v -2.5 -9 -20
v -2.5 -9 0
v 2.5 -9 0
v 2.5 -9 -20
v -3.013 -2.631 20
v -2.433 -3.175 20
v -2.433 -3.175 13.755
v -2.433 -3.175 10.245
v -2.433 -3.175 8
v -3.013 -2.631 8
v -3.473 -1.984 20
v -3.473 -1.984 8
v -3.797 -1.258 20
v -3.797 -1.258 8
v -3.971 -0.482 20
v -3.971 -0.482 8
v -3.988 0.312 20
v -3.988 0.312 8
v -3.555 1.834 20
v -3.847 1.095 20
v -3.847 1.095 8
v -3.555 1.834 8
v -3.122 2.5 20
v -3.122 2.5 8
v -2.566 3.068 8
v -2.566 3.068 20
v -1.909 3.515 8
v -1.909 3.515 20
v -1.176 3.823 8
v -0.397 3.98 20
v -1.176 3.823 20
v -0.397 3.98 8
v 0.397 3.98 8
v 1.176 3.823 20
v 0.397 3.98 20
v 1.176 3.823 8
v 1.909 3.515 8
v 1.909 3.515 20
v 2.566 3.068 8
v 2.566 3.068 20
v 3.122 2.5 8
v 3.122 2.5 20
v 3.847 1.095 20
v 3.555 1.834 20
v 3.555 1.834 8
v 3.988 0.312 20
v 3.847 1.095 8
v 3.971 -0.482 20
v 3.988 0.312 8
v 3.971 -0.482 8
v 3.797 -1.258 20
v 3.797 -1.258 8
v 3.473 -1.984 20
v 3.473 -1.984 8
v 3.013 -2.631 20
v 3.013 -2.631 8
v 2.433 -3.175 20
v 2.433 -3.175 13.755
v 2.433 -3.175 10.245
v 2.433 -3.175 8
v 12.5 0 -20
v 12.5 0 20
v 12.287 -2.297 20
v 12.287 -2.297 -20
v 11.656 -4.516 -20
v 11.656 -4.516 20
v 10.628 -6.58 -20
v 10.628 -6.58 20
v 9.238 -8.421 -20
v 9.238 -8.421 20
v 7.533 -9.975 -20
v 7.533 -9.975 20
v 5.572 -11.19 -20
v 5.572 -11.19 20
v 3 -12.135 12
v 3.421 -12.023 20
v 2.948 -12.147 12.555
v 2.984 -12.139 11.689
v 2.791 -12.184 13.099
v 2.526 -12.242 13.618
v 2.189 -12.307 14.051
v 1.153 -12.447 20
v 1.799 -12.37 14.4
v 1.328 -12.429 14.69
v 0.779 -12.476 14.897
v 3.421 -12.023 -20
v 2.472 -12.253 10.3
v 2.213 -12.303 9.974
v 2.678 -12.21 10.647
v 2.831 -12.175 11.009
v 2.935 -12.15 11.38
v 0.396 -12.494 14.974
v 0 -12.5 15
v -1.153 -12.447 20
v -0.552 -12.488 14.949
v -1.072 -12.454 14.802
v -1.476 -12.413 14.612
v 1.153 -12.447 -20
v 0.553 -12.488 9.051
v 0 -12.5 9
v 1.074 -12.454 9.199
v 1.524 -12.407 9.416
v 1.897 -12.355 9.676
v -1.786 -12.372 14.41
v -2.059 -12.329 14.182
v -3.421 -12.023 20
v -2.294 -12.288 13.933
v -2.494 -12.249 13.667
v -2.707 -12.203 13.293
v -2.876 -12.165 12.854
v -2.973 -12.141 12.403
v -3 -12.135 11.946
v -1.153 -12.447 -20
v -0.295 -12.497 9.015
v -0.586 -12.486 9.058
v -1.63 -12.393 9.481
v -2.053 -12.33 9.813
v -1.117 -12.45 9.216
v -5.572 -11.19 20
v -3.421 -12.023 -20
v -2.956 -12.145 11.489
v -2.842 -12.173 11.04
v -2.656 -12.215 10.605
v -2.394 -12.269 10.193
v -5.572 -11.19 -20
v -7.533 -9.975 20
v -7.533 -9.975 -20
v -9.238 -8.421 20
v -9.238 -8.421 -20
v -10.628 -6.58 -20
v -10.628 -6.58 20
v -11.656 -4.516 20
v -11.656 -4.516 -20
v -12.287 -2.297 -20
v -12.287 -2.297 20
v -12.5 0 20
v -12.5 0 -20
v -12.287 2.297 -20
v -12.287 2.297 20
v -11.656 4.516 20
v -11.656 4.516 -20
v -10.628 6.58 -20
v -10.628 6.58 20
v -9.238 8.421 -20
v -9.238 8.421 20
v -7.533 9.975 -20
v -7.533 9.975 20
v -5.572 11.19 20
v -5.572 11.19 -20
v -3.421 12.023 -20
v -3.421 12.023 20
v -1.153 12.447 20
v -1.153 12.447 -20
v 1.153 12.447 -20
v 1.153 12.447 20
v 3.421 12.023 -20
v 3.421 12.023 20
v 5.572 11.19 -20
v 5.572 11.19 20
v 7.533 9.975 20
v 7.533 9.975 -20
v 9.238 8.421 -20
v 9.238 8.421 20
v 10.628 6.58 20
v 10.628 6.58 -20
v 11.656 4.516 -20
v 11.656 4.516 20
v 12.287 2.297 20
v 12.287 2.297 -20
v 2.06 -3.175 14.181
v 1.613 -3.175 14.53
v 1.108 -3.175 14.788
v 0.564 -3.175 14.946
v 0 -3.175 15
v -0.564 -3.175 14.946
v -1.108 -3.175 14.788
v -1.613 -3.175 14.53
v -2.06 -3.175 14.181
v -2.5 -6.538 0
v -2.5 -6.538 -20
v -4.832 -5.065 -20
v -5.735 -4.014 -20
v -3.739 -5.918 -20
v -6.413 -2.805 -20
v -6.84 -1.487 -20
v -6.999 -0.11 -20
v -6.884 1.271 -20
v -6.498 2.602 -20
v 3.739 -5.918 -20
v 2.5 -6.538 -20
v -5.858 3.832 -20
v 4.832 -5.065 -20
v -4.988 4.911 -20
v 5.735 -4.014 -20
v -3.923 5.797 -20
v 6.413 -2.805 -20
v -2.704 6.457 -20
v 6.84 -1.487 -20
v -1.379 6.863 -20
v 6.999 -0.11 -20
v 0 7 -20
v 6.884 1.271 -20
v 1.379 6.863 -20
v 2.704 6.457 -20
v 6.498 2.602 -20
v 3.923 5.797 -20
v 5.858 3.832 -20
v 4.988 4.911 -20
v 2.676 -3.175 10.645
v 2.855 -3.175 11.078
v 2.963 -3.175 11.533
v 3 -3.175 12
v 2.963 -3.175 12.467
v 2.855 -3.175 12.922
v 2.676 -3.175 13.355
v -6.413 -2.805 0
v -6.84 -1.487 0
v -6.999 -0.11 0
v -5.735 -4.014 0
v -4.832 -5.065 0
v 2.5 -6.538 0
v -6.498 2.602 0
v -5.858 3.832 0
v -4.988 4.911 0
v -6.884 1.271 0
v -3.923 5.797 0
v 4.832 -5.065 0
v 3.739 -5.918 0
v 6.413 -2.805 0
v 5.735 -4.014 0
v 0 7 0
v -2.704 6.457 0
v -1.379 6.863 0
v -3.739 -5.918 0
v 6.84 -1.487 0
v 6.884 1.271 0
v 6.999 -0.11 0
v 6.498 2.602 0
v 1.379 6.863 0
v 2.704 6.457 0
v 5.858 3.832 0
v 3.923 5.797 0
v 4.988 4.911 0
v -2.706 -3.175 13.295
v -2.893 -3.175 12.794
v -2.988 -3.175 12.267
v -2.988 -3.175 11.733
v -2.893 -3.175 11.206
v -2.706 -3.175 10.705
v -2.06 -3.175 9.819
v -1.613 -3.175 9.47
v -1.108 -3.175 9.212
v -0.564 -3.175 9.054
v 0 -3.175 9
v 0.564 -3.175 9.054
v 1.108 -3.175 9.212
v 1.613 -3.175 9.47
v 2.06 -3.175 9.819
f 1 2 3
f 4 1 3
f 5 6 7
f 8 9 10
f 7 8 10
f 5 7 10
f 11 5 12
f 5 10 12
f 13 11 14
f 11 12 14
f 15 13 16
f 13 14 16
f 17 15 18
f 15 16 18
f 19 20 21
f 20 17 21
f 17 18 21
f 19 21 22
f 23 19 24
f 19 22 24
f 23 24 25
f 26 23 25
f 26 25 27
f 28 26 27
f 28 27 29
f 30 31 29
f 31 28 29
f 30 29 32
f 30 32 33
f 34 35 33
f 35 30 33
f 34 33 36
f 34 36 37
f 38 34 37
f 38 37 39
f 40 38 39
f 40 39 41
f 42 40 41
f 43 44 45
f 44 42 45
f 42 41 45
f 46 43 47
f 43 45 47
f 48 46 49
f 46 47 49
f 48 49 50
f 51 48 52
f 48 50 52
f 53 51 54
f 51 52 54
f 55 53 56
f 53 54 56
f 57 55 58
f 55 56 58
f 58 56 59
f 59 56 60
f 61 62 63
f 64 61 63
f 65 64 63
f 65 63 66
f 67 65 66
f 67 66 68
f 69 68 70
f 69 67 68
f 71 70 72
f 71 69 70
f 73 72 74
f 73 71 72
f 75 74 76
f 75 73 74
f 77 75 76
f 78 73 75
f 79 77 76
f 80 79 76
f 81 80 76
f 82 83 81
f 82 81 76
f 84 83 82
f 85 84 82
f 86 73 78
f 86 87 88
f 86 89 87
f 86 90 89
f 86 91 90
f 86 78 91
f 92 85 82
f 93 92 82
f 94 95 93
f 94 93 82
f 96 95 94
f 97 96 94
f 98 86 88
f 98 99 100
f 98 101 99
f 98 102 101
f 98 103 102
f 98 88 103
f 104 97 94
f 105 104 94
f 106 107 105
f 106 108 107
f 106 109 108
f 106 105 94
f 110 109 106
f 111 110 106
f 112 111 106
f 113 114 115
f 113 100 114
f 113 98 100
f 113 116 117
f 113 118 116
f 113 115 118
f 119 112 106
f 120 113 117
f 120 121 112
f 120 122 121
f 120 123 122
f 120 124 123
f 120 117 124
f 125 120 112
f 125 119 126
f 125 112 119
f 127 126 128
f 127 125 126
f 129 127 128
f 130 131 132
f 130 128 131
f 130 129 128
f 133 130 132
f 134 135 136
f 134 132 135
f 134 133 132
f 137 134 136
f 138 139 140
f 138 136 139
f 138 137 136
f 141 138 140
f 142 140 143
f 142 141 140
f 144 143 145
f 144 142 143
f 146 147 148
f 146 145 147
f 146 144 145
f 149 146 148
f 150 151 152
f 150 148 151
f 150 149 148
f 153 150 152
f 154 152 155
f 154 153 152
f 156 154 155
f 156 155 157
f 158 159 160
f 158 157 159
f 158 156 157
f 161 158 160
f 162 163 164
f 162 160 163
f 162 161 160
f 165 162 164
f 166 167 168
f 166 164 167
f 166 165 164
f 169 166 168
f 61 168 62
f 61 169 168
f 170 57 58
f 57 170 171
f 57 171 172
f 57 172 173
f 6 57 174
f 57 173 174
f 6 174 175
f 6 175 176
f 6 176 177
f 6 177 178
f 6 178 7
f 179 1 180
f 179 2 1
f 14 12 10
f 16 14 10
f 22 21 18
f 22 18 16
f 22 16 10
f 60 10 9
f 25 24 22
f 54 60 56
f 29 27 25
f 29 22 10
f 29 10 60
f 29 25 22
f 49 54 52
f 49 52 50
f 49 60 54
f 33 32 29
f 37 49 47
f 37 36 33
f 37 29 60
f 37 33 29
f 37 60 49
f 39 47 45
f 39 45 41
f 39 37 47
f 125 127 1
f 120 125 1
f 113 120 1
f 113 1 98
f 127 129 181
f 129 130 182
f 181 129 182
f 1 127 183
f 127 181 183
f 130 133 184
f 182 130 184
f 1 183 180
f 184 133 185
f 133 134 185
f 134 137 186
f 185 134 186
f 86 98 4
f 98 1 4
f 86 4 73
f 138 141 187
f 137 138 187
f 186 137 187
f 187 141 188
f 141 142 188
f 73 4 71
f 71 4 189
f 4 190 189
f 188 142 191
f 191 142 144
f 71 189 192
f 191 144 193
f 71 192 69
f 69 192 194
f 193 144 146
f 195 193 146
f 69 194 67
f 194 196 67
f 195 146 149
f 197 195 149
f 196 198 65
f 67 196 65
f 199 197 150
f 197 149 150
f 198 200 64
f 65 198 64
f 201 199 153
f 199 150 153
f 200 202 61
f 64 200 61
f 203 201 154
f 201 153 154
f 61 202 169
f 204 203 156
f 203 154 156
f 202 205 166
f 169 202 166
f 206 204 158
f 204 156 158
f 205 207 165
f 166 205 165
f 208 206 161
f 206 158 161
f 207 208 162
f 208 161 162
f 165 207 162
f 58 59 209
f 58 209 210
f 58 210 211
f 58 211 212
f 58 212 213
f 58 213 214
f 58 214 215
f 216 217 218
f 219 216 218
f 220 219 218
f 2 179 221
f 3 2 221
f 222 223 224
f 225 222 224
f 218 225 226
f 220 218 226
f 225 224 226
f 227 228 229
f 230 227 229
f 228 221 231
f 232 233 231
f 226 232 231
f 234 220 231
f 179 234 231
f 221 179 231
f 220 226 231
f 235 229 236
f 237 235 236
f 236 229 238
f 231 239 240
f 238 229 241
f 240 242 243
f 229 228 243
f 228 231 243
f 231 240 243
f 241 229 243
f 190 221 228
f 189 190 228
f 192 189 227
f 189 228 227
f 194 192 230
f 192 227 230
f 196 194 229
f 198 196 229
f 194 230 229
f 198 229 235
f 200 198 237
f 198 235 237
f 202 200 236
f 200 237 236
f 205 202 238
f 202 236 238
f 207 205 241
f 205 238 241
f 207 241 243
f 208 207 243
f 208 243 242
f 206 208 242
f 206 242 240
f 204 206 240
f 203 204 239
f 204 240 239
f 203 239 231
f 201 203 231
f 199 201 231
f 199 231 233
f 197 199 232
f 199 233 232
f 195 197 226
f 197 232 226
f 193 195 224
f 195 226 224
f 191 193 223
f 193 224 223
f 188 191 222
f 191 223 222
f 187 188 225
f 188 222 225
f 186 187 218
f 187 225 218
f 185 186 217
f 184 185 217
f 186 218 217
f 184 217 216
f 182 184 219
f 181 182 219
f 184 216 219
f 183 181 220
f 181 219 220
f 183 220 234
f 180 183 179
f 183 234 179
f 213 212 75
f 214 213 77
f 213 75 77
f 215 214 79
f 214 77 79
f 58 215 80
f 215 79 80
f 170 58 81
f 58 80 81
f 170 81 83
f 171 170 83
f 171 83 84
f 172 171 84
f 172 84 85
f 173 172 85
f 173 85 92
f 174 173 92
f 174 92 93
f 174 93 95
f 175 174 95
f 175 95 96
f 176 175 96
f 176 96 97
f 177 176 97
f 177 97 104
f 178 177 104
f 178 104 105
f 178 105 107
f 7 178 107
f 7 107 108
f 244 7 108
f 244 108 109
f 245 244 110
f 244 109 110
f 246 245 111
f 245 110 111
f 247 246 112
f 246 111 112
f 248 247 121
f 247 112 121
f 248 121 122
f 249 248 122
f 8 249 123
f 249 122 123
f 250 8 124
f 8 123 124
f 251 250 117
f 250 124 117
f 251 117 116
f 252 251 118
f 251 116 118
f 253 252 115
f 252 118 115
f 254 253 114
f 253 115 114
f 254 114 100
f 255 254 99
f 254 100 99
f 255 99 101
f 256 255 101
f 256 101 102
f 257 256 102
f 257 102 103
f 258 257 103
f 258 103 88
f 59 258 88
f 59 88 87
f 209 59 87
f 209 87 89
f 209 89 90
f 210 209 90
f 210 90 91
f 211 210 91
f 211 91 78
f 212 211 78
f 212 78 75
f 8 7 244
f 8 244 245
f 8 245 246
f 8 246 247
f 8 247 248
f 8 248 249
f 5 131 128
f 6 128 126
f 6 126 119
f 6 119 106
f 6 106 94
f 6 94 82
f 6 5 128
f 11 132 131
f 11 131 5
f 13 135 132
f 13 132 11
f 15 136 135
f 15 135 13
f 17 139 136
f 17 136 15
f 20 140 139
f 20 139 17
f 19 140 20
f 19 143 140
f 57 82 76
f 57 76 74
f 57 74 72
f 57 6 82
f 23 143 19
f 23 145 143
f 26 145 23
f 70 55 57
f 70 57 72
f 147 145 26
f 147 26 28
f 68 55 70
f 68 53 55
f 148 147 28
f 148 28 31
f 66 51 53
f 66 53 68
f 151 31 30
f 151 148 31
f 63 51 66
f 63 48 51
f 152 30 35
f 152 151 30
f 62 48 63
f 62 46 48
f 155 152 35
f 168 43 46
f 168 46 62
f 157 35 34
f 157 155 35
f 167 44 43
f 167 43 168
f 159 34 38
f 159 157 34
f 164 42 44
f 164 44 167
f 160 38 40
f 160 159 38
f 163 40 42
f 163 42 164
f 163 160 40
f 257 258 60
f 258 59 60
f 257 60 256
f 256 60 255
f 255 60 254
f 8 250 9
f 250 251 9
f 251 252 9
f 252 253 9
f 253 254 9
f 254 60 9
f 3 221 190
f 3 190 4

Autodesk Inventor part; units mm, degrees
ref_plane "YZ Plane" through (0, 0, 0) normal (1, 0, 0) x (0, 1, 0)
ref_plane "XZ Plane" through (0, 0, 0) normal (0, 1, 0) x (-1, 0, 0)
sketch "Sketch1" plane through (0, 0, 0) normal (0, 0, 1) x (1, 0, 0)
  circle A0 centre (0, 0) radius 7 projected
  line L0 (-2.5, -9) -> (-2.5, -6.5383) projected
  line L1 (-2.5, -9) -> (2.5, -9) projected
  line L2 (-2.5, -9) -> (-2.5, -6.5383) projected
  line L3 (2.5, -6.5383) -> (2.5, -9) projected
  circle A1 centre (0, 0) radius 12.5
  dimension "d0" = 25
extrude "Extrusion1" add sketch "Sketch1" against normal blind 20
sketch "Sketch2" plane through (0, 0, 0) normal (0, 0, 1) x (1, 0, 0)
  circle A0 centre (0, 0) radius 12.5 projected
extrude "Extrusion2" add sketch "Sketch2" along normal blind 8
sketch "Sketch3" plane through (0, 0, 8) normal (0, 0, 1) x (1, 0, 0)
  circle A0 centre (0, 0) radius 12.5 projected
  line L0 (2.433, -3.175) -> (-2.433, -3.175) projected
  arc A1 (2.433, -3.175) -> (-2.433, -3.175) centre (0, 0) ccw projected
extrude "Extrusion3" add sketch "Sketch3" along normal blind 12
ref_plane "Work Plane2" through (0, -12.5, 0) normal (0, -1, 0) x (1, 0, 0)
ref_plane "Work Plane1" through (2.433, -3.175, 10) normal (0, -1, 0) x (-1, 0, 0)
sketch "Sketch4" plane through (0, -12.5, 0) normal (0, -1, 0) x (1, 0, 0)
  line L0 (12.5, 20) -> (-12.5, 20) projected
  circle A0 centre (0, 12) radius 3
  point P0 (0, 0)
  dimension "d7" = 6
  dimension "d8" = 8
ref_plane "Work Plane3" through (-6.9376, -3.175, 8.1734) normal (0, -1, 0) x (1, 0, 0)
extrude "Extrusion4" cut sketch "Sketch4" against normal up to surface (9.325 mm away)
thread "Thread1" size "M6x1" class "6H" standard "ANSI Metric M Profile" length 20
properties part number "nmrv-50 to mega torque mototr coupler"
